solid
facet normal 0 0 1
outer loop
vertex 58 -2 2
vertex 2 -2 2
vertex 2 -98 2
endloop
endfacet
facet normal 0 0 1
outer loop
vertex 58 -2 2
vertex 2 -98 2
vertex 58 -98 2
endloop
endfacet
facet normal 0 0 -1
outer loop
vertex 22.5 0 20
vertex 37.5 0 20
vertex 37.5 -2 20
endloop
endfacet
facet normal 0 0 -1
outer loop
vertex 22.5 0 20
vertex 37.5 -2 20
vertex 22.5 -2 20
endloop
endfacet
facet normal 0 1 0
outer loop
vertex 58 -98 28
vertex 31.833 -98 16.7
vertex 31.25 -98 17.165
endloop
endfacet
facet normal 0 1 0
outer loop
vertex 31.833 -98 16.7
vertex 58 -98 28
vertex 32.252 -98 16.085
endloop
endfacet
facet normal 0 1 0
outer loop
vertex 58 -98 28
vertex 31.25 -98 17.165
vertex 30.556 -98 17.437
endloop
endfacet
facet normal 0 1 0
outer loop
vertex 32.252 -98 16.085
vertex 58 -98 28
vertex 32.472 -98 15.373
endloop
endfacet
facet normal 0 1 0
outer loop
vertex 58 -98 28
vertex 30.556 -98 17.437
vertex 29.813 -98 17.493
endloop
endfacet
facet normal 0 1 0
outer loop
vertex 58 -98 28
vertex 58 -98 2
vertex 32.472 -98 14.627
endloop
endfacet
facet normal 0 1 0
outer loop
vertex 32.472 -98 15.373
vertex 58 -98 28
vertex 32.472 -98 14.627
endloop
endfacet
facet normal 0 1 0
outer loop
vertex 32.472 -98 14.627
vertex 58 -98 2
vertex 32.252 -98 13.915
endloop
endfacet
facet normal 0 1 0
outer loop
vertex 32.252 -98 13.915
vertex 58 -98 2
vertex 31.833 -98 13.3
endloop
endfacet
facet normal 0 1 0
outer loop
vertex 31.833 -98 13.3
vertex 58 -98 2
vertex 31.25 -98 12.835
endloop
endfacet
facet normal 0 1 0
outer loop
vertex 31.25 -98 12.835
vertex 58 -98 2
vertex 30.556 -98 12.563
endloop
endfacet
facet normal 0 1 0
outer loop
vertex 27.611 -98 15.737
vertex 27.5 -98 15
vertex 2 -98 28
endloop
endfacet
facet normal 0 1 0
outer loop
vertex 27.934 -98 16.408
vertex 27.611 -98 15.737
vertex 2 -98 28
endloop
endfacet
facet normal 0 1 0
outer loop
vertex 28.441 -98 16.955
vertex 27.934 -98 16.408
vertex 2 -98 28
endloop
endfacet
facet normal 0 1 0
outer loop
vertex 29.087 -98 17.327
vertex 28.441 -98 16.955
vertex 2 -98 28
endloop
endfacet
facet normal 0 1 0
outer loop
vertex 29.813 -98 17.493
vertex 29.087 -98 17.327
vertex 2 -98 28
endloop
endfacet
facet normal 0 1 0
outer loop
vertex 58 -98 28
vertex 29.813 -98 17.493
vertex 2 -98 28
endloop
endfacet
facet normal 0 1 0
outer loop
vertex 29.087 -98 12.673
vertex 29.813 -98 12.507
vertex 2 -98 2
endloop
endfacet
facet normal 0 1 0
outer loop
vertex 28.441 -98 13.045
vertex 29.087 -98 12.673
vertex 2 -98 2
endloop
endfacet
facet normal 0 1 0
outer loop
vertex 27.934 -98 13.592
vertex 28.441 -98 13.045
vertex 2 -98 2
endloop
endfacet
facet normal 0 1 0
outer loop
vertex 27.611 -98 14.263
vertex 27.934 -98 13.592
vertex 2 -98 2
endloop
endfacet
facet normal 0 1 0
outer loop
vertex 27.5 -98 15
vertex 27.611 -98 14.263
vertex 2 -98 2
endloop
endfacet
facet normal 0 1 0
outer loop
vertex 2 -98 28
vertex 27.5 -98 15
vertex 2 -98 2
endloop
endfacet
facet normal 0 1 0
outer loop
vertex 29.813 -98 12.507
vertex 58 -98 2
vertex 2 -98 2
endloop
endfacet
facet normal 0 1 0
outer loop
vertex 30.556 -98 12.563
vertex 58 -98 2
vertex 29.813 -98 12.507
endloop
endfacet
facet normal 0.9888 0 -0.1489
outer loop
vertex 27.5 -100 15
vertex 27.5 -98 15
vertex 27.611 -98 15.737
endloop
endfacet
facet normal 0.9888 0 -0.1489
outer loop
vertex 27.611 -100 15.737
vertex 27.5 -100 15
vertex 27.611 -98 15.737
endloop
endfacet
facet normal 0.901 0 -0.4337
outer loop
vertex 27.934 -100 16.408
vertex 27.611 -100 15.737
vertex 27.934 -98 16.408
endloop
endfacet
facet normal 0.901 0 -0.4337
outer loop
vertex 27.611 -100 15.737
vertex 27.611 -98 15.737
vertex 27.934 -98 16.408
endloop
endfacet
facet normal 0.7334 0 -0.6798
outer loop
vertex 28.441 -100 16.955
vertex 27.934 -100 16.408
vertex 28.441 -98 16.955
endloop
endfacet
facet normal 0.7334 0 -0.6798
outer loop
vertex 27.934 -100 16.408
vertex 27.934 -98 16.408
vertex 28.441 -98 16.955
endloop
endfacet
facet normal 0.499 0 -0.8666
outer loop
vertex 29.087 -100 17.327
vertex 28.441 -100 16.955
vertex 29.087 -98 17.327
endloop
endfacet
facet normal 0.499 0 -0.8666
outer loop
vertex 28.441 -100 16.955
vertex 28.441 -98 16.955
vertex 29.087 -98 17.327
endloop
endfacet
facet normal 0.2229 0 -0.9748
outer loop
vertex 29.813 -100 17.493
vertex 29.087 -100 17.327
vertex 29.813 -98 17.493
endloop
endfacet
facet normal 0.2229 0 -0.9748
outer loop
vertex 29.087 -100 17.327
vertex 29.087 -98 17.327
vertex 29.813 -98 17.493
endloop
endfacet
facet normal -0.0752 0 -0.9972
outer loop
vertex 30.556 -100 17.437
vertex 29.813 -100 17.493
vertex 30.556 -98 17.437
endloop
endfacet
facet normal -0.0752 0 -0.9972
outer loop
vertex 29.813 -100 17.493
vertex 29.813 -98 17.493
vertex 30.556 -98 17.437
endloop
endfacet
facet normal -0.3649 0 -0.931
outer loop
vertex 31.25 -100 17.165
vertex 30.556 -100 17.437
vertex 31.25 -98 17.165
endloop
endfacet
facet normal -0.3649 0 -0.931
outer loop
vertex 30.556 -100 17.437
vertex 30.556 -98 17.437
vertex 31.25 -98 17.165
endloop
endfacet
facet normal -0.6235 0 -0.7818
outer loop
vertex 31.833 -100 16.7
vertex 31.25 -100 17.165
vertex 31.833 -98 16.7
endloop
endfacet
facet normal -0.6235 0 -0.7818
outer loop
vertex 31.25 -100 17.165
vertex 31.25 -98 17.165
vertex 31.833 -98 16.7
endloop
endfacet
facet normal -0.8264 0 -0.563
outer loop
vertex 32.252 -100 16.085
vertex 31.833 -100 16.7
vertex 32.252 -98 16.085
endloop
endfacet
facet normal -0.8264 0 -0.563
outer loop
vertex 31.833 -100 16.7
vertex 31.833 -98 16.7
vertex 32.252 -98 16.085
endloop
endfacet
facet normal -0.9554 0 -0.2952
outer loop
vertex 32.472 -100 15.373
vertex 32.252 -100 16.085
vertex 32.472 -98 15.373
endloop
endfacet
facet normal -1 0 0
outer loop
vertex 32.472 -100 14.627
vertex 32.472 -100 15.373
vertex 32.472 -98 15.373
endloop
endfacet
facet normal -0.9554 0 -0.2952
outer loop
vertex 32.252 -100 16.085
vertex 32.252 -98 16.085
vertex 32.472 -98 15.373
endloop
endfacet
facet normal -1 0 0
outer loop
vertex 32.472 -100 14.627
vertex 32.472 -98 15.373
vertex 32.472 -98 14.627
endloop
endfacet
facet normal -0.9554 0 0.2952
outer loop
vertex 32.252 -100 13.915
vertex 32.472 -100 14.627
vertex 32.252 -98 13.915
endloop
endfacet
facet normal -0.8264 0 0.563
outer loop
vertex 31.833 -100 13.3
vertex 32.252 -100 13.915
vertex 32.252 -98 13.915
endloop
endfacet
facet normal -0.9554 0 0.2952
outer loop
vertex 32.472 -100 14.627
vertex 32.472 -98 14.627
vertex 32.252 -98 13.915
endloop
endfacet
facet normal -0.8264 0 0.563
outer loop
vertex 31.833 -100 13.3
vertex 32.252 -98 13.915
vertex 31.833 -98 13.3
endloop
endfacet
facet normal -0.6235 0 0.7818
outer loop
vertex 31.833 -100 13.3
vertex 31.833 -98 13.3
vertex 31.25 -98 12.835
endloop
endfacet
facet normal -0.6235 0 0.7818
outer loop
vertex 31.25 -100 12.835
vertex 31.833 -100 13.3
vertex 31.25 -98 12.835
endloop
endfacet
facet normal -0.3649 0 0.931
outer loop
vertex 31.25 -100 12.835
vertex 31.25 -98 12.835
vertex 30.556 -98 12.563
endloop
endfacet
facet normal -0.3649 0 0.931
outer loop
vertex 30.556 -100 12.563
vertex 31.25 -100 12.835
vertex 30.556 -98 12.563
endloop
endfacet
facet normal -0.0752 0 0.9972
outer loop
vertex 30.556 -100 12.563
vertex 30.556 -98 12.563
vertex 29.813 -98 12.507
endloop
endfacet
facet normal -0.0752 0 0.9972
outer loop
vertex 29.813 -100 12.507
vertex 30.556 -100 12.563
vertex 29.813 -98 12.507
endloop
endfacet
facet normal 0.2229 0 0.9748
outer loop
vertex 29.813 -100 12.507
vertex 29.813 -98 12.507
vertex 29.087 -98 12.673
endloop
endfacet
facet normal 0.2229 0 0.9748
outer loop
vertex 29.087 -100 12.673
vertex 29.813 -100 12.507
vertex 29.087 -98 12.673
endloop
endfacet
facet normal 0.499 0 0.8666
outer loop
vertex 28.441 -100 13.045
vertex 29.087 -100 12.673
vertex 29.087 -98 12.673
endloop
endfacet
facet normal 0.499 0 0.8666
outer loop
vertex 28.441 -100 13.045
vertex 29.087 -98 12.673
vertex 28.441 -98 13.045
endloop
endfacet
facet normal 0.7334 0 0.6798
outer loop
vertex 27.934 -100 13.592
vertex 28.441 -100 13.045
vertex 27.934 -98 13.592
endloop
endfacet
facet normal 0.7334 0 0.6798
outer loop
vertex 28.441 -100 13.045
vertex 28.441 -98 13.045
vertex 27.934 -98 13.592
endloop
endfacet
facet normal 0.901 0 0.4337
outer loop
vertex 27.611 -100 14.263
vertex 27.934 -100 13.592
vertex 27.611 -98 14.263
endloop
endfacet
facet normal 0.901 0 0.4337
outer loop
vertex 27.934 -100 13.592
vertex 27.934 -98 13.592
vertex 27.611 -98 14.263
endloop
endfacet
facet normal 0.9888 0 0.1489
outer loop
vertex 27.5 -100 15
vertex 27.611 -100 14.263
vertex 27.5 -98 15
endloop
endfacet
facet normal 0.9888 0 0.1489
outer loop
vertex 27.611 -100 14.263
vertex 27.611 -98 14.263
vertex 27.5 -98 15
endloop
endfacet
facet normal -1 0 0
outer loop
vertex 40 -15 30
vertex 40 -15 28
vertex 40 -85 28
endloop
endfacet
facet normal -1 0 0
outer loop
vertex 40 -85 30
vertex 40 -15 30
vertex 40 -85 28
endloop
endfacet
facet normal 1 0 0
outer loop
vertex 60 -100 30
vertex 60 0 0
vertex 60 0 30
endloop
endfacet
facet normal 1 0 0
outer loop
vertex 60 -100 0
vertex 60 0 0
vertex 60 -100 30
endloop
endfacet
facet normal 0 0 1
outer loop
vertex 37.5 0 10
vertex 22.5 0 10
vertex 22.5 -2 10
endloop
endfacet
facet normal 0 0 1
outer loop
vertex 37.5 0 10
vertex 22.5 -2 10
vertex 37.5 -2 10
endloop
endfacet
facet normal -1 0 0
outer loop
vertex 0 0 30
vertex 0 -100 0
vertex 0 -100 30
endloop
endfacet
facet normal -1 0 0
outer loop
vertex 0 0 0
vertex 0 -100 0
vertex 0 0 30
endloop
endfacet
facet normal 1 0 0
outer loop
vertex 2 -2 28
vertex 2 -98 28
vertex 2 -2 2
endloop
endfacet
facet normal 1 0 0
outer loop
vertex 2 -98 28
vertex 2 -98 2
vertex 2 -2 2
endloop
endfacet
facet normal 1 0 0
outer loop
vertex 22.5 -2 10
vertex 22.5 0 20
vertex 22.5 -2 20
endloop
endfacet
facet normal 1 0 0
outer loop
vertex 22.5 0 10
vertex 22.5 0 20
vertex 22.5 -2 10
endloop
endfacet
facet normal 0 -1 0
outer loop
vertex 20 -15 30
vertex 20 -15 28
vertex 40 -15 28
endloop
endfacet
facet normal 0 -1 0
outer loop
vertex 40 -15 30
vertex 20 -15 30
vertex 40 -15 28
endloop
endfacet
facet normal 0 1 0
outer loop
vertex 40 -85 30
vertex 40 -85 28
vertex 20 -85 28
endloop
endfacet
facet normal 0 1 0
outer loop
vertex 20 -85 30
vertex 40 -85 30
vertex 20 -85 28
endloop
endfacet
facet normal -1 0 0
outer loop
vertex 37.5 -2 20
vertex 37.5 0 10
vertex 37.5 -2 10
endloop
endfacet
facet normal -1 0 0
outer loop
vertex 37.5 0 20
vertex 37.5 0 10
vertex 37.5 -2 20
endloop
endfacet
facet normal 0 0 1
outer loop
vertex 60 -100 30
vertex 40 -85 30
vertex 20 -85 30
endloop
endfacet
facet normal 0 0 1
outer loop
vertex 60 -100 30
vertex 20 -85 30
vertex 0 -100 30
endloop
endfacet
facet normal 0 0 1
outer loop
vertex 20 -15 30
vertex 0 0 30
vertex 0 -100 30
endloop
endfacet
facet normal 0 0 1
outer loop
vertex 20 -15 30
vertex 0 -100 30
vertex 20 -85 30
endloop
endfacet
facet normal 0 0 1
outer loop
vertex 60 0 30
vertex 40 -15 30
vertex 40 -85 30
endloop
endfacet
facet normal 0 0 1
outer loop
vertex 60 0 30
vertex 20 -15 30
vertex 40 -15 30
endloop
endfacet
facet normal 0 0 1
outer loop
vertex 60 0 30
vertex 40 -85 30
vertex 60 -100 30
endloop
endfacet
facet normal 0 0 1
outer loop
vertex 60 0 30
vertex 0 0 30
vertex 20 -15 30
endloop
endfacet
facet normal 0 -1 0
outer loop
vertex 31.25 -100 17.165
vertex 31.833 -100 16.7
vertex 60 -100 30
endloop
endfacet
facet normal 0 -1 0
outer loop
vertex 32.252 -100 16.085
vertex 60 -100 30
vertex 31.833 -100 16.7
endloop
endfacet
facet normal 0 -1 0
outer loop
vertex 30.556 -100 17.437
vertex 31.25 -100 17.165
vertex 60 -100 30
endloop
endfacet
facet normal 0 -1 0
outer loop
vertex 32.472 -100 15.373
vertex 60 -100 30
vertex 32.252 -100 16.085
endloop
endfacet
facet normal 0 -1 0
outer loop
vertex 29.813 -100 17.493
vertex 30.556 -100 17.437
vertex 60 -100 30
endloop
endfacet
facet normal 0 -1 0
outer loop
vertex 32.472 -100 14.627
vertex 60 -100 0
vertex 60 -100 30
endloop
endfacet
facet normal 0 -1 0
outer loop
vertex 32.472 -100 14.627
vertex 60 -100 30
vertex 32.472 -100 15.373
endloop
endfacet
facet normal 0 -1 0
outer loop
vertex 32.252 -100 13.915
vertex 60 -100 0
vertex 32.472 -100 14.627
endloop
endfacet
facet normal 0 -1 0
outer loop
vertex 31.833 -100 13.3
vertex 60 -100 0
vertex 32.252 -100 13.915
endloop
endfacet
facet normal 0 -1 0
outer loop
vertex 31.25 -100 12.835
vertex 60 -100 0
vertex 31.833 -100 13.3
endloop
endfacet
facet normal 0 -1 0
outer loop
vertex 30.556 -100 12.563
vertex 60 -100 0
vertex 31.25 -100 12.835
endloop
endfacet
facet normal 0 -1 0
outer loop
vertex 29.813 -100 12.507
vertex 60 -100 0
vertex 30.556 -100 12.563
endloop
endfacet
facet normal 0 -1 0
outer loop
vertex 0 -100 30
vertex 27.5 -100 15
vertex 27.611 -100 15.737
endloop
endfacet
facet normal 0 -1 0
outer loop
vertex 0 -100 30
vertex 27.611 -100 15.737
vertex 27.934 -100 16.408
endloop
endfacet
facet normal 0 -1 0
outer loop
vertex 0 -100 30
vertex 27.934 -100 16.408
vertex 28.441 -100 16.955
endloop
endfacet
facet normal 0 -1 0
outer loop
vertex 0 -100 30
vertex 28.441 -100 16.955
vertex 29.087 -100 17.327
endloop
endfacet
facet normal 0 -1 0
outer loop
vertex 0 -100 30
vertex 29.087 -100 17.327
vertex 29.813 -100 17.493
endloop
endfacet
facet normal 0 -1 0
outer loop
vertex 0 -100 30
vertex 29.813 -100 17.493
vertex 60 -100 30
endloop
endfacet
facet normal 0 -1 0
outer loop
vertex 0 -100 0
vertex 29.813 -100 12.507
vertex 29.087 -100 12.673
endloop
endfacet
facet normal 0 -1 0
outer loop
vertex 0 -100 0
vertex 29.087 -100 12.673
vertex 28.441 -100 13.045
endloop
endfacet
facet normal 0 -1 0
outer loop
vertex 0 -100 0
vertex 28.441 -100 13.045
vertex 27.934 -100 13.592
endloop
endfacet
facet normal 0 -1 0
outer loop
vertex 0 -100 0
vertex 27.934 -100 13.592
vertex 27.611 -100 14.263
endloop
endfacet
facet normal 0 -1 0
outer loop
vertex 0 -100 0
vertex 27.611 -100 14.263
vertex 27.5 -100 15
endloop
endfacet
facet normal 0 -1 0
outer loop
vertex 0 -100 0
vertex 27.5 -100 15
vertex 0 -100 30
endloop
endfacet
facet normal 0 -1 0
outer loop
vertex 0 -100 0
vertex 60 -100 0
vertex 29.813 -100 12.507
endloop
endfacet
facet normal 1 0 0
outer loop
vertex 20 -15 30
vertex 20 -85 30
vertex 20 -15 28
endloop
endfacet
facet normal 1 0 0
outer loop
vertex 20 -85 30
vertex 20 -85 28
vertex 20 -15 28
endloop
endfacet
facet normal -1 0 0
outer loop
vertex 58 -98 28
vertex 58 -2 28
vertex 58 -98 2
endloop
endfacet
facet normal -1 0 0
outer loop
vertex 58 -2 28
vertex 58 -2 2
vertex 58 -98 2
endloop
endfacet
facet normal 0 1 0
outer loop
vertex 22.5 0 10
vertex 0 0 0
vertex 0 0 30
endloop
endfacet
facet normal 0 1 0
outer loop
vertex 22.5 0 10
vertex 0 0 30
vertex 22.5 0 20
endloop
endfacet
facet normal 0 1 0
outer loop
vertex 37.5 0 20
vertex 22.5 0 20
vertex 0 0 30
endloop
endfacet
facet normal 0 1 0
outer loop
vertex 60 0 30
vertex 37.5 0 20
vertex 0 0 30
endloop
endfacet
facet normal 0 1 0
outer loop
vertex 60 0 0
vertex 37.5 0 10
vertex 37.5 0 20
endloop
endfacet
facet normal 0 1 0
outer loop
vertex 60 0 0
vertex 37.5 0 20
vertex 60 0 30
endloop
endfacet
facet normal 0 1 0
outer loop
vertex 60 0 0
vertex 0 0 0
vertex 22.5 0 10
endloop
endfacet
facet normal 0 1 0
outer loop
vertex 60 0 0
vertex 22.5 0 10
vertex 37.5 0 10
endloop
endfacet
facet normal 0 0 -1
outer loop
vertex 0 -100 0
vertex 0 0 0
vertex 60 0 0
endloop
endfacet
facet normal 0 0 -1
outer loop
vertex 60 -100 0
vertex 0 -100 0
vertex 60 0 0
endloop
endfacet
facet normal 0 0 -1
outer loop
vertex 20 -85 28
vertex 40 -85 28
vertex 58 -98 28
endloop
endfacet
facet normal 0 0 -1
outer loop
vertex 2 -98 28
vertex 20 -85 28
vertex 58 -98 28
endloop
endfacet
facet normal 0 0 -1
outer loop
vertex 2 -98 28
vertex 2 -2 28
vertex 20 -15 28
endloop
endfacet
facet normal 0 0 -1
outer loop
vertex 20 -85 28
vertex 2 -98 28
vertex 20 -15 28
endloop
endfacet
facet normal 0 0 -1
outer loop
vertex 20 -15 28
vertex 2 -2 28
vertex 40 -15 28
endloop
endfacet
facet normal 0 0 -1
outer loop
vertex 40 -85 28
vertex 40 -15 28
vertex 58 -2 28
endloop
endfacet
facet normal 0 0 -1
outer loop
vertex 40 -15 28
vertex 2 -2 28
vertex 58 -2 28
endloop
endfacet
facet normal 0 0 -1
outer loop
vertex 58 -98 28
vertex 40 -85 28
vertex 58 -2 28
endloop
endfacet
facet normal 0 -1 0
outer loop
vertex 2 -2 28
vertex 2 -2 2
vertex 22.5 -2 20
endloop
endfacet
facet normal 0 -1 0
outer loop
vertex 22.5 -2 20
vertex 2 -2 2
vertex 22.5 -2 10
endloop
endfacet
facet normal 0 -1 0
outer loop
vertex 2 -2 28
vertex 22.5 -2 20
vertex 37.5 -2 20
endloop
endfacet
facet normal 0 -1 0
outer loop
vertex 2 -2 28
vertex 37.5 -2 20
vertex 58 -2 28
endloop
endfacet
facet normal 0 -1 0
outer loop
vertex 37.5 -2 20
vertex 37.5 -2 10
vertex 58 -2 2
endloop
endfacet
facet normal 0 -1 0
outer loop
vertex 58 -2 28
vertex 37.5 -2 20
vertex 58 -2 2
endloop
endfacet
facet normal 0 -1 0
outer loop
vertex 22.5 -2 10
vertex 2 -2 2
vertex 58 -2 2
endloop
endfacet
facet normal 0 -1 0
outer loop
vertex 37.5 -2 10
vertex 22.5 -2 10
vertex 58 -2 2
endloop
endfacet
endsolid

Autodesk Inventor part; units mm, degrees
ref_plane "YZ Plane" through (0, 0, 0) normal (1, 0, 0) x (0, 1, 0)
ref_plane "XZ Plane" through (0, 0, 0) normal (0, 1, 0) x (-1, 0, 0)
ref_plane "XY Plane" through (0, 0, 0) normal (0, 0, 1) x (1, 0, 0)
sketch "Эскиз1" plane through (0, 0, 0) normal (0, 0, 1) x (1, 0, 0)
  line L0 (0, 0) -> (60, 0)
  line L1 (60, 0) -> (60, -100)
  line L2 (60, -100) -> (0, -100)
  line L3 (0, -100) -> (0, 0)
  line L4 (2, -2) -> (58, -2)
  line L5 (58, -2) -> (58, -98)
  line L6 (58, -98) -> (2, -98)
  line L7 (2, -98) -> (2, -2)
  line L8 (0, 0) -> (60, -100) construction
  line L9 (60, 0) -> (0, -100) construction
  line L10 (2, -2) -> (58, -98) construction
  line L11 (58, -2) -> (2, -98) construction
  line L12 (20, -15) -> (40, -15)
  line L13 (40, -15) -> (40, -85)
  line L14 (40, -85) -> (20, -85)
  line L15 (20, -85) -> (20, -15)
  line L16 (20, -15) -> (40, -85) construction
  line L17 (40, -15) -> (20, -85) construction
  point P0 (30, -50)
  point P1 (30, -50)
  dimension "d0" = 60
  dimension "d1" = 100
  dimension "d2" = 56
  dimension "d3" = 96
  dimension "d8" = 20
  dimension "d9" = 70
extrude "Выдавливание1" add sketch "Эскиз1" along normal blind 30 contours L0 L1 L2 L3 | L4 L5 L6 L7 | L12 L13 L14 L15
extrude "Выдавливание2" cut sketch "Эскиз1" along normal blind 28 contours L4 L5 L6 L7 | L12 L13 L14 L15
extrude "Выдавливание3" add sketch "Эскиз1" along normal blind 30 contours L12 L13 L14 L15
extrude "Выдавливание4" cut sketch "Эскиз1" along normal blind 35 contours L12 L13 L14 L15
sketch "Эскиз2" plane through (0, 0, 0) normal (0, 1, 0) x (-1, 0, 0)
  line L0 (-60, 0) -> (-60, 30) projected
  line L1 (-60, 30) -> (0, 30) projected
  line L2 (-60, 0) -> (0, 30) construction
  line L3 (-60, 0) -> (0, 0) projected
  line L4 (-60, 30) -> (0, 0) construction
  line L5 (-37.5, 20) -> (-22.5, 20)
  line L6 (-22.5, 20) -> (-22.5, 10)
  line L7 (-22.5, 10) -> (-37.5, 10)
  line L8 (-37.5, 10) -> (-37.5, 20)
  line L9 (-37.5, 20) -> (-22.5, 10) construction
  line L10 (-22.5, 20) -> (-37.5, 10) construction
  circle A0 centre (-30, 15) radius 2.5
  dimension "d14" = 15
  dimension "d15" = 10
  dimension "d16" = 5
extrude "Выдавливание5" cut sketch "Эскиз2" along normal mid plane 100 contours L5 L6 L7 L8 | A0
extrude "Выдавливание6" cut sketch "Эскиз2" against normal through all contours A0
extrude "Выдавливание9" add sketch "Эскиз1" along normal blind 2 contours L0 L1 L2 L3 | L4 L5 L6 L7 | L12 L13 L14 L15
properties part number "Корпус" material "Полиацеталь, черный"
